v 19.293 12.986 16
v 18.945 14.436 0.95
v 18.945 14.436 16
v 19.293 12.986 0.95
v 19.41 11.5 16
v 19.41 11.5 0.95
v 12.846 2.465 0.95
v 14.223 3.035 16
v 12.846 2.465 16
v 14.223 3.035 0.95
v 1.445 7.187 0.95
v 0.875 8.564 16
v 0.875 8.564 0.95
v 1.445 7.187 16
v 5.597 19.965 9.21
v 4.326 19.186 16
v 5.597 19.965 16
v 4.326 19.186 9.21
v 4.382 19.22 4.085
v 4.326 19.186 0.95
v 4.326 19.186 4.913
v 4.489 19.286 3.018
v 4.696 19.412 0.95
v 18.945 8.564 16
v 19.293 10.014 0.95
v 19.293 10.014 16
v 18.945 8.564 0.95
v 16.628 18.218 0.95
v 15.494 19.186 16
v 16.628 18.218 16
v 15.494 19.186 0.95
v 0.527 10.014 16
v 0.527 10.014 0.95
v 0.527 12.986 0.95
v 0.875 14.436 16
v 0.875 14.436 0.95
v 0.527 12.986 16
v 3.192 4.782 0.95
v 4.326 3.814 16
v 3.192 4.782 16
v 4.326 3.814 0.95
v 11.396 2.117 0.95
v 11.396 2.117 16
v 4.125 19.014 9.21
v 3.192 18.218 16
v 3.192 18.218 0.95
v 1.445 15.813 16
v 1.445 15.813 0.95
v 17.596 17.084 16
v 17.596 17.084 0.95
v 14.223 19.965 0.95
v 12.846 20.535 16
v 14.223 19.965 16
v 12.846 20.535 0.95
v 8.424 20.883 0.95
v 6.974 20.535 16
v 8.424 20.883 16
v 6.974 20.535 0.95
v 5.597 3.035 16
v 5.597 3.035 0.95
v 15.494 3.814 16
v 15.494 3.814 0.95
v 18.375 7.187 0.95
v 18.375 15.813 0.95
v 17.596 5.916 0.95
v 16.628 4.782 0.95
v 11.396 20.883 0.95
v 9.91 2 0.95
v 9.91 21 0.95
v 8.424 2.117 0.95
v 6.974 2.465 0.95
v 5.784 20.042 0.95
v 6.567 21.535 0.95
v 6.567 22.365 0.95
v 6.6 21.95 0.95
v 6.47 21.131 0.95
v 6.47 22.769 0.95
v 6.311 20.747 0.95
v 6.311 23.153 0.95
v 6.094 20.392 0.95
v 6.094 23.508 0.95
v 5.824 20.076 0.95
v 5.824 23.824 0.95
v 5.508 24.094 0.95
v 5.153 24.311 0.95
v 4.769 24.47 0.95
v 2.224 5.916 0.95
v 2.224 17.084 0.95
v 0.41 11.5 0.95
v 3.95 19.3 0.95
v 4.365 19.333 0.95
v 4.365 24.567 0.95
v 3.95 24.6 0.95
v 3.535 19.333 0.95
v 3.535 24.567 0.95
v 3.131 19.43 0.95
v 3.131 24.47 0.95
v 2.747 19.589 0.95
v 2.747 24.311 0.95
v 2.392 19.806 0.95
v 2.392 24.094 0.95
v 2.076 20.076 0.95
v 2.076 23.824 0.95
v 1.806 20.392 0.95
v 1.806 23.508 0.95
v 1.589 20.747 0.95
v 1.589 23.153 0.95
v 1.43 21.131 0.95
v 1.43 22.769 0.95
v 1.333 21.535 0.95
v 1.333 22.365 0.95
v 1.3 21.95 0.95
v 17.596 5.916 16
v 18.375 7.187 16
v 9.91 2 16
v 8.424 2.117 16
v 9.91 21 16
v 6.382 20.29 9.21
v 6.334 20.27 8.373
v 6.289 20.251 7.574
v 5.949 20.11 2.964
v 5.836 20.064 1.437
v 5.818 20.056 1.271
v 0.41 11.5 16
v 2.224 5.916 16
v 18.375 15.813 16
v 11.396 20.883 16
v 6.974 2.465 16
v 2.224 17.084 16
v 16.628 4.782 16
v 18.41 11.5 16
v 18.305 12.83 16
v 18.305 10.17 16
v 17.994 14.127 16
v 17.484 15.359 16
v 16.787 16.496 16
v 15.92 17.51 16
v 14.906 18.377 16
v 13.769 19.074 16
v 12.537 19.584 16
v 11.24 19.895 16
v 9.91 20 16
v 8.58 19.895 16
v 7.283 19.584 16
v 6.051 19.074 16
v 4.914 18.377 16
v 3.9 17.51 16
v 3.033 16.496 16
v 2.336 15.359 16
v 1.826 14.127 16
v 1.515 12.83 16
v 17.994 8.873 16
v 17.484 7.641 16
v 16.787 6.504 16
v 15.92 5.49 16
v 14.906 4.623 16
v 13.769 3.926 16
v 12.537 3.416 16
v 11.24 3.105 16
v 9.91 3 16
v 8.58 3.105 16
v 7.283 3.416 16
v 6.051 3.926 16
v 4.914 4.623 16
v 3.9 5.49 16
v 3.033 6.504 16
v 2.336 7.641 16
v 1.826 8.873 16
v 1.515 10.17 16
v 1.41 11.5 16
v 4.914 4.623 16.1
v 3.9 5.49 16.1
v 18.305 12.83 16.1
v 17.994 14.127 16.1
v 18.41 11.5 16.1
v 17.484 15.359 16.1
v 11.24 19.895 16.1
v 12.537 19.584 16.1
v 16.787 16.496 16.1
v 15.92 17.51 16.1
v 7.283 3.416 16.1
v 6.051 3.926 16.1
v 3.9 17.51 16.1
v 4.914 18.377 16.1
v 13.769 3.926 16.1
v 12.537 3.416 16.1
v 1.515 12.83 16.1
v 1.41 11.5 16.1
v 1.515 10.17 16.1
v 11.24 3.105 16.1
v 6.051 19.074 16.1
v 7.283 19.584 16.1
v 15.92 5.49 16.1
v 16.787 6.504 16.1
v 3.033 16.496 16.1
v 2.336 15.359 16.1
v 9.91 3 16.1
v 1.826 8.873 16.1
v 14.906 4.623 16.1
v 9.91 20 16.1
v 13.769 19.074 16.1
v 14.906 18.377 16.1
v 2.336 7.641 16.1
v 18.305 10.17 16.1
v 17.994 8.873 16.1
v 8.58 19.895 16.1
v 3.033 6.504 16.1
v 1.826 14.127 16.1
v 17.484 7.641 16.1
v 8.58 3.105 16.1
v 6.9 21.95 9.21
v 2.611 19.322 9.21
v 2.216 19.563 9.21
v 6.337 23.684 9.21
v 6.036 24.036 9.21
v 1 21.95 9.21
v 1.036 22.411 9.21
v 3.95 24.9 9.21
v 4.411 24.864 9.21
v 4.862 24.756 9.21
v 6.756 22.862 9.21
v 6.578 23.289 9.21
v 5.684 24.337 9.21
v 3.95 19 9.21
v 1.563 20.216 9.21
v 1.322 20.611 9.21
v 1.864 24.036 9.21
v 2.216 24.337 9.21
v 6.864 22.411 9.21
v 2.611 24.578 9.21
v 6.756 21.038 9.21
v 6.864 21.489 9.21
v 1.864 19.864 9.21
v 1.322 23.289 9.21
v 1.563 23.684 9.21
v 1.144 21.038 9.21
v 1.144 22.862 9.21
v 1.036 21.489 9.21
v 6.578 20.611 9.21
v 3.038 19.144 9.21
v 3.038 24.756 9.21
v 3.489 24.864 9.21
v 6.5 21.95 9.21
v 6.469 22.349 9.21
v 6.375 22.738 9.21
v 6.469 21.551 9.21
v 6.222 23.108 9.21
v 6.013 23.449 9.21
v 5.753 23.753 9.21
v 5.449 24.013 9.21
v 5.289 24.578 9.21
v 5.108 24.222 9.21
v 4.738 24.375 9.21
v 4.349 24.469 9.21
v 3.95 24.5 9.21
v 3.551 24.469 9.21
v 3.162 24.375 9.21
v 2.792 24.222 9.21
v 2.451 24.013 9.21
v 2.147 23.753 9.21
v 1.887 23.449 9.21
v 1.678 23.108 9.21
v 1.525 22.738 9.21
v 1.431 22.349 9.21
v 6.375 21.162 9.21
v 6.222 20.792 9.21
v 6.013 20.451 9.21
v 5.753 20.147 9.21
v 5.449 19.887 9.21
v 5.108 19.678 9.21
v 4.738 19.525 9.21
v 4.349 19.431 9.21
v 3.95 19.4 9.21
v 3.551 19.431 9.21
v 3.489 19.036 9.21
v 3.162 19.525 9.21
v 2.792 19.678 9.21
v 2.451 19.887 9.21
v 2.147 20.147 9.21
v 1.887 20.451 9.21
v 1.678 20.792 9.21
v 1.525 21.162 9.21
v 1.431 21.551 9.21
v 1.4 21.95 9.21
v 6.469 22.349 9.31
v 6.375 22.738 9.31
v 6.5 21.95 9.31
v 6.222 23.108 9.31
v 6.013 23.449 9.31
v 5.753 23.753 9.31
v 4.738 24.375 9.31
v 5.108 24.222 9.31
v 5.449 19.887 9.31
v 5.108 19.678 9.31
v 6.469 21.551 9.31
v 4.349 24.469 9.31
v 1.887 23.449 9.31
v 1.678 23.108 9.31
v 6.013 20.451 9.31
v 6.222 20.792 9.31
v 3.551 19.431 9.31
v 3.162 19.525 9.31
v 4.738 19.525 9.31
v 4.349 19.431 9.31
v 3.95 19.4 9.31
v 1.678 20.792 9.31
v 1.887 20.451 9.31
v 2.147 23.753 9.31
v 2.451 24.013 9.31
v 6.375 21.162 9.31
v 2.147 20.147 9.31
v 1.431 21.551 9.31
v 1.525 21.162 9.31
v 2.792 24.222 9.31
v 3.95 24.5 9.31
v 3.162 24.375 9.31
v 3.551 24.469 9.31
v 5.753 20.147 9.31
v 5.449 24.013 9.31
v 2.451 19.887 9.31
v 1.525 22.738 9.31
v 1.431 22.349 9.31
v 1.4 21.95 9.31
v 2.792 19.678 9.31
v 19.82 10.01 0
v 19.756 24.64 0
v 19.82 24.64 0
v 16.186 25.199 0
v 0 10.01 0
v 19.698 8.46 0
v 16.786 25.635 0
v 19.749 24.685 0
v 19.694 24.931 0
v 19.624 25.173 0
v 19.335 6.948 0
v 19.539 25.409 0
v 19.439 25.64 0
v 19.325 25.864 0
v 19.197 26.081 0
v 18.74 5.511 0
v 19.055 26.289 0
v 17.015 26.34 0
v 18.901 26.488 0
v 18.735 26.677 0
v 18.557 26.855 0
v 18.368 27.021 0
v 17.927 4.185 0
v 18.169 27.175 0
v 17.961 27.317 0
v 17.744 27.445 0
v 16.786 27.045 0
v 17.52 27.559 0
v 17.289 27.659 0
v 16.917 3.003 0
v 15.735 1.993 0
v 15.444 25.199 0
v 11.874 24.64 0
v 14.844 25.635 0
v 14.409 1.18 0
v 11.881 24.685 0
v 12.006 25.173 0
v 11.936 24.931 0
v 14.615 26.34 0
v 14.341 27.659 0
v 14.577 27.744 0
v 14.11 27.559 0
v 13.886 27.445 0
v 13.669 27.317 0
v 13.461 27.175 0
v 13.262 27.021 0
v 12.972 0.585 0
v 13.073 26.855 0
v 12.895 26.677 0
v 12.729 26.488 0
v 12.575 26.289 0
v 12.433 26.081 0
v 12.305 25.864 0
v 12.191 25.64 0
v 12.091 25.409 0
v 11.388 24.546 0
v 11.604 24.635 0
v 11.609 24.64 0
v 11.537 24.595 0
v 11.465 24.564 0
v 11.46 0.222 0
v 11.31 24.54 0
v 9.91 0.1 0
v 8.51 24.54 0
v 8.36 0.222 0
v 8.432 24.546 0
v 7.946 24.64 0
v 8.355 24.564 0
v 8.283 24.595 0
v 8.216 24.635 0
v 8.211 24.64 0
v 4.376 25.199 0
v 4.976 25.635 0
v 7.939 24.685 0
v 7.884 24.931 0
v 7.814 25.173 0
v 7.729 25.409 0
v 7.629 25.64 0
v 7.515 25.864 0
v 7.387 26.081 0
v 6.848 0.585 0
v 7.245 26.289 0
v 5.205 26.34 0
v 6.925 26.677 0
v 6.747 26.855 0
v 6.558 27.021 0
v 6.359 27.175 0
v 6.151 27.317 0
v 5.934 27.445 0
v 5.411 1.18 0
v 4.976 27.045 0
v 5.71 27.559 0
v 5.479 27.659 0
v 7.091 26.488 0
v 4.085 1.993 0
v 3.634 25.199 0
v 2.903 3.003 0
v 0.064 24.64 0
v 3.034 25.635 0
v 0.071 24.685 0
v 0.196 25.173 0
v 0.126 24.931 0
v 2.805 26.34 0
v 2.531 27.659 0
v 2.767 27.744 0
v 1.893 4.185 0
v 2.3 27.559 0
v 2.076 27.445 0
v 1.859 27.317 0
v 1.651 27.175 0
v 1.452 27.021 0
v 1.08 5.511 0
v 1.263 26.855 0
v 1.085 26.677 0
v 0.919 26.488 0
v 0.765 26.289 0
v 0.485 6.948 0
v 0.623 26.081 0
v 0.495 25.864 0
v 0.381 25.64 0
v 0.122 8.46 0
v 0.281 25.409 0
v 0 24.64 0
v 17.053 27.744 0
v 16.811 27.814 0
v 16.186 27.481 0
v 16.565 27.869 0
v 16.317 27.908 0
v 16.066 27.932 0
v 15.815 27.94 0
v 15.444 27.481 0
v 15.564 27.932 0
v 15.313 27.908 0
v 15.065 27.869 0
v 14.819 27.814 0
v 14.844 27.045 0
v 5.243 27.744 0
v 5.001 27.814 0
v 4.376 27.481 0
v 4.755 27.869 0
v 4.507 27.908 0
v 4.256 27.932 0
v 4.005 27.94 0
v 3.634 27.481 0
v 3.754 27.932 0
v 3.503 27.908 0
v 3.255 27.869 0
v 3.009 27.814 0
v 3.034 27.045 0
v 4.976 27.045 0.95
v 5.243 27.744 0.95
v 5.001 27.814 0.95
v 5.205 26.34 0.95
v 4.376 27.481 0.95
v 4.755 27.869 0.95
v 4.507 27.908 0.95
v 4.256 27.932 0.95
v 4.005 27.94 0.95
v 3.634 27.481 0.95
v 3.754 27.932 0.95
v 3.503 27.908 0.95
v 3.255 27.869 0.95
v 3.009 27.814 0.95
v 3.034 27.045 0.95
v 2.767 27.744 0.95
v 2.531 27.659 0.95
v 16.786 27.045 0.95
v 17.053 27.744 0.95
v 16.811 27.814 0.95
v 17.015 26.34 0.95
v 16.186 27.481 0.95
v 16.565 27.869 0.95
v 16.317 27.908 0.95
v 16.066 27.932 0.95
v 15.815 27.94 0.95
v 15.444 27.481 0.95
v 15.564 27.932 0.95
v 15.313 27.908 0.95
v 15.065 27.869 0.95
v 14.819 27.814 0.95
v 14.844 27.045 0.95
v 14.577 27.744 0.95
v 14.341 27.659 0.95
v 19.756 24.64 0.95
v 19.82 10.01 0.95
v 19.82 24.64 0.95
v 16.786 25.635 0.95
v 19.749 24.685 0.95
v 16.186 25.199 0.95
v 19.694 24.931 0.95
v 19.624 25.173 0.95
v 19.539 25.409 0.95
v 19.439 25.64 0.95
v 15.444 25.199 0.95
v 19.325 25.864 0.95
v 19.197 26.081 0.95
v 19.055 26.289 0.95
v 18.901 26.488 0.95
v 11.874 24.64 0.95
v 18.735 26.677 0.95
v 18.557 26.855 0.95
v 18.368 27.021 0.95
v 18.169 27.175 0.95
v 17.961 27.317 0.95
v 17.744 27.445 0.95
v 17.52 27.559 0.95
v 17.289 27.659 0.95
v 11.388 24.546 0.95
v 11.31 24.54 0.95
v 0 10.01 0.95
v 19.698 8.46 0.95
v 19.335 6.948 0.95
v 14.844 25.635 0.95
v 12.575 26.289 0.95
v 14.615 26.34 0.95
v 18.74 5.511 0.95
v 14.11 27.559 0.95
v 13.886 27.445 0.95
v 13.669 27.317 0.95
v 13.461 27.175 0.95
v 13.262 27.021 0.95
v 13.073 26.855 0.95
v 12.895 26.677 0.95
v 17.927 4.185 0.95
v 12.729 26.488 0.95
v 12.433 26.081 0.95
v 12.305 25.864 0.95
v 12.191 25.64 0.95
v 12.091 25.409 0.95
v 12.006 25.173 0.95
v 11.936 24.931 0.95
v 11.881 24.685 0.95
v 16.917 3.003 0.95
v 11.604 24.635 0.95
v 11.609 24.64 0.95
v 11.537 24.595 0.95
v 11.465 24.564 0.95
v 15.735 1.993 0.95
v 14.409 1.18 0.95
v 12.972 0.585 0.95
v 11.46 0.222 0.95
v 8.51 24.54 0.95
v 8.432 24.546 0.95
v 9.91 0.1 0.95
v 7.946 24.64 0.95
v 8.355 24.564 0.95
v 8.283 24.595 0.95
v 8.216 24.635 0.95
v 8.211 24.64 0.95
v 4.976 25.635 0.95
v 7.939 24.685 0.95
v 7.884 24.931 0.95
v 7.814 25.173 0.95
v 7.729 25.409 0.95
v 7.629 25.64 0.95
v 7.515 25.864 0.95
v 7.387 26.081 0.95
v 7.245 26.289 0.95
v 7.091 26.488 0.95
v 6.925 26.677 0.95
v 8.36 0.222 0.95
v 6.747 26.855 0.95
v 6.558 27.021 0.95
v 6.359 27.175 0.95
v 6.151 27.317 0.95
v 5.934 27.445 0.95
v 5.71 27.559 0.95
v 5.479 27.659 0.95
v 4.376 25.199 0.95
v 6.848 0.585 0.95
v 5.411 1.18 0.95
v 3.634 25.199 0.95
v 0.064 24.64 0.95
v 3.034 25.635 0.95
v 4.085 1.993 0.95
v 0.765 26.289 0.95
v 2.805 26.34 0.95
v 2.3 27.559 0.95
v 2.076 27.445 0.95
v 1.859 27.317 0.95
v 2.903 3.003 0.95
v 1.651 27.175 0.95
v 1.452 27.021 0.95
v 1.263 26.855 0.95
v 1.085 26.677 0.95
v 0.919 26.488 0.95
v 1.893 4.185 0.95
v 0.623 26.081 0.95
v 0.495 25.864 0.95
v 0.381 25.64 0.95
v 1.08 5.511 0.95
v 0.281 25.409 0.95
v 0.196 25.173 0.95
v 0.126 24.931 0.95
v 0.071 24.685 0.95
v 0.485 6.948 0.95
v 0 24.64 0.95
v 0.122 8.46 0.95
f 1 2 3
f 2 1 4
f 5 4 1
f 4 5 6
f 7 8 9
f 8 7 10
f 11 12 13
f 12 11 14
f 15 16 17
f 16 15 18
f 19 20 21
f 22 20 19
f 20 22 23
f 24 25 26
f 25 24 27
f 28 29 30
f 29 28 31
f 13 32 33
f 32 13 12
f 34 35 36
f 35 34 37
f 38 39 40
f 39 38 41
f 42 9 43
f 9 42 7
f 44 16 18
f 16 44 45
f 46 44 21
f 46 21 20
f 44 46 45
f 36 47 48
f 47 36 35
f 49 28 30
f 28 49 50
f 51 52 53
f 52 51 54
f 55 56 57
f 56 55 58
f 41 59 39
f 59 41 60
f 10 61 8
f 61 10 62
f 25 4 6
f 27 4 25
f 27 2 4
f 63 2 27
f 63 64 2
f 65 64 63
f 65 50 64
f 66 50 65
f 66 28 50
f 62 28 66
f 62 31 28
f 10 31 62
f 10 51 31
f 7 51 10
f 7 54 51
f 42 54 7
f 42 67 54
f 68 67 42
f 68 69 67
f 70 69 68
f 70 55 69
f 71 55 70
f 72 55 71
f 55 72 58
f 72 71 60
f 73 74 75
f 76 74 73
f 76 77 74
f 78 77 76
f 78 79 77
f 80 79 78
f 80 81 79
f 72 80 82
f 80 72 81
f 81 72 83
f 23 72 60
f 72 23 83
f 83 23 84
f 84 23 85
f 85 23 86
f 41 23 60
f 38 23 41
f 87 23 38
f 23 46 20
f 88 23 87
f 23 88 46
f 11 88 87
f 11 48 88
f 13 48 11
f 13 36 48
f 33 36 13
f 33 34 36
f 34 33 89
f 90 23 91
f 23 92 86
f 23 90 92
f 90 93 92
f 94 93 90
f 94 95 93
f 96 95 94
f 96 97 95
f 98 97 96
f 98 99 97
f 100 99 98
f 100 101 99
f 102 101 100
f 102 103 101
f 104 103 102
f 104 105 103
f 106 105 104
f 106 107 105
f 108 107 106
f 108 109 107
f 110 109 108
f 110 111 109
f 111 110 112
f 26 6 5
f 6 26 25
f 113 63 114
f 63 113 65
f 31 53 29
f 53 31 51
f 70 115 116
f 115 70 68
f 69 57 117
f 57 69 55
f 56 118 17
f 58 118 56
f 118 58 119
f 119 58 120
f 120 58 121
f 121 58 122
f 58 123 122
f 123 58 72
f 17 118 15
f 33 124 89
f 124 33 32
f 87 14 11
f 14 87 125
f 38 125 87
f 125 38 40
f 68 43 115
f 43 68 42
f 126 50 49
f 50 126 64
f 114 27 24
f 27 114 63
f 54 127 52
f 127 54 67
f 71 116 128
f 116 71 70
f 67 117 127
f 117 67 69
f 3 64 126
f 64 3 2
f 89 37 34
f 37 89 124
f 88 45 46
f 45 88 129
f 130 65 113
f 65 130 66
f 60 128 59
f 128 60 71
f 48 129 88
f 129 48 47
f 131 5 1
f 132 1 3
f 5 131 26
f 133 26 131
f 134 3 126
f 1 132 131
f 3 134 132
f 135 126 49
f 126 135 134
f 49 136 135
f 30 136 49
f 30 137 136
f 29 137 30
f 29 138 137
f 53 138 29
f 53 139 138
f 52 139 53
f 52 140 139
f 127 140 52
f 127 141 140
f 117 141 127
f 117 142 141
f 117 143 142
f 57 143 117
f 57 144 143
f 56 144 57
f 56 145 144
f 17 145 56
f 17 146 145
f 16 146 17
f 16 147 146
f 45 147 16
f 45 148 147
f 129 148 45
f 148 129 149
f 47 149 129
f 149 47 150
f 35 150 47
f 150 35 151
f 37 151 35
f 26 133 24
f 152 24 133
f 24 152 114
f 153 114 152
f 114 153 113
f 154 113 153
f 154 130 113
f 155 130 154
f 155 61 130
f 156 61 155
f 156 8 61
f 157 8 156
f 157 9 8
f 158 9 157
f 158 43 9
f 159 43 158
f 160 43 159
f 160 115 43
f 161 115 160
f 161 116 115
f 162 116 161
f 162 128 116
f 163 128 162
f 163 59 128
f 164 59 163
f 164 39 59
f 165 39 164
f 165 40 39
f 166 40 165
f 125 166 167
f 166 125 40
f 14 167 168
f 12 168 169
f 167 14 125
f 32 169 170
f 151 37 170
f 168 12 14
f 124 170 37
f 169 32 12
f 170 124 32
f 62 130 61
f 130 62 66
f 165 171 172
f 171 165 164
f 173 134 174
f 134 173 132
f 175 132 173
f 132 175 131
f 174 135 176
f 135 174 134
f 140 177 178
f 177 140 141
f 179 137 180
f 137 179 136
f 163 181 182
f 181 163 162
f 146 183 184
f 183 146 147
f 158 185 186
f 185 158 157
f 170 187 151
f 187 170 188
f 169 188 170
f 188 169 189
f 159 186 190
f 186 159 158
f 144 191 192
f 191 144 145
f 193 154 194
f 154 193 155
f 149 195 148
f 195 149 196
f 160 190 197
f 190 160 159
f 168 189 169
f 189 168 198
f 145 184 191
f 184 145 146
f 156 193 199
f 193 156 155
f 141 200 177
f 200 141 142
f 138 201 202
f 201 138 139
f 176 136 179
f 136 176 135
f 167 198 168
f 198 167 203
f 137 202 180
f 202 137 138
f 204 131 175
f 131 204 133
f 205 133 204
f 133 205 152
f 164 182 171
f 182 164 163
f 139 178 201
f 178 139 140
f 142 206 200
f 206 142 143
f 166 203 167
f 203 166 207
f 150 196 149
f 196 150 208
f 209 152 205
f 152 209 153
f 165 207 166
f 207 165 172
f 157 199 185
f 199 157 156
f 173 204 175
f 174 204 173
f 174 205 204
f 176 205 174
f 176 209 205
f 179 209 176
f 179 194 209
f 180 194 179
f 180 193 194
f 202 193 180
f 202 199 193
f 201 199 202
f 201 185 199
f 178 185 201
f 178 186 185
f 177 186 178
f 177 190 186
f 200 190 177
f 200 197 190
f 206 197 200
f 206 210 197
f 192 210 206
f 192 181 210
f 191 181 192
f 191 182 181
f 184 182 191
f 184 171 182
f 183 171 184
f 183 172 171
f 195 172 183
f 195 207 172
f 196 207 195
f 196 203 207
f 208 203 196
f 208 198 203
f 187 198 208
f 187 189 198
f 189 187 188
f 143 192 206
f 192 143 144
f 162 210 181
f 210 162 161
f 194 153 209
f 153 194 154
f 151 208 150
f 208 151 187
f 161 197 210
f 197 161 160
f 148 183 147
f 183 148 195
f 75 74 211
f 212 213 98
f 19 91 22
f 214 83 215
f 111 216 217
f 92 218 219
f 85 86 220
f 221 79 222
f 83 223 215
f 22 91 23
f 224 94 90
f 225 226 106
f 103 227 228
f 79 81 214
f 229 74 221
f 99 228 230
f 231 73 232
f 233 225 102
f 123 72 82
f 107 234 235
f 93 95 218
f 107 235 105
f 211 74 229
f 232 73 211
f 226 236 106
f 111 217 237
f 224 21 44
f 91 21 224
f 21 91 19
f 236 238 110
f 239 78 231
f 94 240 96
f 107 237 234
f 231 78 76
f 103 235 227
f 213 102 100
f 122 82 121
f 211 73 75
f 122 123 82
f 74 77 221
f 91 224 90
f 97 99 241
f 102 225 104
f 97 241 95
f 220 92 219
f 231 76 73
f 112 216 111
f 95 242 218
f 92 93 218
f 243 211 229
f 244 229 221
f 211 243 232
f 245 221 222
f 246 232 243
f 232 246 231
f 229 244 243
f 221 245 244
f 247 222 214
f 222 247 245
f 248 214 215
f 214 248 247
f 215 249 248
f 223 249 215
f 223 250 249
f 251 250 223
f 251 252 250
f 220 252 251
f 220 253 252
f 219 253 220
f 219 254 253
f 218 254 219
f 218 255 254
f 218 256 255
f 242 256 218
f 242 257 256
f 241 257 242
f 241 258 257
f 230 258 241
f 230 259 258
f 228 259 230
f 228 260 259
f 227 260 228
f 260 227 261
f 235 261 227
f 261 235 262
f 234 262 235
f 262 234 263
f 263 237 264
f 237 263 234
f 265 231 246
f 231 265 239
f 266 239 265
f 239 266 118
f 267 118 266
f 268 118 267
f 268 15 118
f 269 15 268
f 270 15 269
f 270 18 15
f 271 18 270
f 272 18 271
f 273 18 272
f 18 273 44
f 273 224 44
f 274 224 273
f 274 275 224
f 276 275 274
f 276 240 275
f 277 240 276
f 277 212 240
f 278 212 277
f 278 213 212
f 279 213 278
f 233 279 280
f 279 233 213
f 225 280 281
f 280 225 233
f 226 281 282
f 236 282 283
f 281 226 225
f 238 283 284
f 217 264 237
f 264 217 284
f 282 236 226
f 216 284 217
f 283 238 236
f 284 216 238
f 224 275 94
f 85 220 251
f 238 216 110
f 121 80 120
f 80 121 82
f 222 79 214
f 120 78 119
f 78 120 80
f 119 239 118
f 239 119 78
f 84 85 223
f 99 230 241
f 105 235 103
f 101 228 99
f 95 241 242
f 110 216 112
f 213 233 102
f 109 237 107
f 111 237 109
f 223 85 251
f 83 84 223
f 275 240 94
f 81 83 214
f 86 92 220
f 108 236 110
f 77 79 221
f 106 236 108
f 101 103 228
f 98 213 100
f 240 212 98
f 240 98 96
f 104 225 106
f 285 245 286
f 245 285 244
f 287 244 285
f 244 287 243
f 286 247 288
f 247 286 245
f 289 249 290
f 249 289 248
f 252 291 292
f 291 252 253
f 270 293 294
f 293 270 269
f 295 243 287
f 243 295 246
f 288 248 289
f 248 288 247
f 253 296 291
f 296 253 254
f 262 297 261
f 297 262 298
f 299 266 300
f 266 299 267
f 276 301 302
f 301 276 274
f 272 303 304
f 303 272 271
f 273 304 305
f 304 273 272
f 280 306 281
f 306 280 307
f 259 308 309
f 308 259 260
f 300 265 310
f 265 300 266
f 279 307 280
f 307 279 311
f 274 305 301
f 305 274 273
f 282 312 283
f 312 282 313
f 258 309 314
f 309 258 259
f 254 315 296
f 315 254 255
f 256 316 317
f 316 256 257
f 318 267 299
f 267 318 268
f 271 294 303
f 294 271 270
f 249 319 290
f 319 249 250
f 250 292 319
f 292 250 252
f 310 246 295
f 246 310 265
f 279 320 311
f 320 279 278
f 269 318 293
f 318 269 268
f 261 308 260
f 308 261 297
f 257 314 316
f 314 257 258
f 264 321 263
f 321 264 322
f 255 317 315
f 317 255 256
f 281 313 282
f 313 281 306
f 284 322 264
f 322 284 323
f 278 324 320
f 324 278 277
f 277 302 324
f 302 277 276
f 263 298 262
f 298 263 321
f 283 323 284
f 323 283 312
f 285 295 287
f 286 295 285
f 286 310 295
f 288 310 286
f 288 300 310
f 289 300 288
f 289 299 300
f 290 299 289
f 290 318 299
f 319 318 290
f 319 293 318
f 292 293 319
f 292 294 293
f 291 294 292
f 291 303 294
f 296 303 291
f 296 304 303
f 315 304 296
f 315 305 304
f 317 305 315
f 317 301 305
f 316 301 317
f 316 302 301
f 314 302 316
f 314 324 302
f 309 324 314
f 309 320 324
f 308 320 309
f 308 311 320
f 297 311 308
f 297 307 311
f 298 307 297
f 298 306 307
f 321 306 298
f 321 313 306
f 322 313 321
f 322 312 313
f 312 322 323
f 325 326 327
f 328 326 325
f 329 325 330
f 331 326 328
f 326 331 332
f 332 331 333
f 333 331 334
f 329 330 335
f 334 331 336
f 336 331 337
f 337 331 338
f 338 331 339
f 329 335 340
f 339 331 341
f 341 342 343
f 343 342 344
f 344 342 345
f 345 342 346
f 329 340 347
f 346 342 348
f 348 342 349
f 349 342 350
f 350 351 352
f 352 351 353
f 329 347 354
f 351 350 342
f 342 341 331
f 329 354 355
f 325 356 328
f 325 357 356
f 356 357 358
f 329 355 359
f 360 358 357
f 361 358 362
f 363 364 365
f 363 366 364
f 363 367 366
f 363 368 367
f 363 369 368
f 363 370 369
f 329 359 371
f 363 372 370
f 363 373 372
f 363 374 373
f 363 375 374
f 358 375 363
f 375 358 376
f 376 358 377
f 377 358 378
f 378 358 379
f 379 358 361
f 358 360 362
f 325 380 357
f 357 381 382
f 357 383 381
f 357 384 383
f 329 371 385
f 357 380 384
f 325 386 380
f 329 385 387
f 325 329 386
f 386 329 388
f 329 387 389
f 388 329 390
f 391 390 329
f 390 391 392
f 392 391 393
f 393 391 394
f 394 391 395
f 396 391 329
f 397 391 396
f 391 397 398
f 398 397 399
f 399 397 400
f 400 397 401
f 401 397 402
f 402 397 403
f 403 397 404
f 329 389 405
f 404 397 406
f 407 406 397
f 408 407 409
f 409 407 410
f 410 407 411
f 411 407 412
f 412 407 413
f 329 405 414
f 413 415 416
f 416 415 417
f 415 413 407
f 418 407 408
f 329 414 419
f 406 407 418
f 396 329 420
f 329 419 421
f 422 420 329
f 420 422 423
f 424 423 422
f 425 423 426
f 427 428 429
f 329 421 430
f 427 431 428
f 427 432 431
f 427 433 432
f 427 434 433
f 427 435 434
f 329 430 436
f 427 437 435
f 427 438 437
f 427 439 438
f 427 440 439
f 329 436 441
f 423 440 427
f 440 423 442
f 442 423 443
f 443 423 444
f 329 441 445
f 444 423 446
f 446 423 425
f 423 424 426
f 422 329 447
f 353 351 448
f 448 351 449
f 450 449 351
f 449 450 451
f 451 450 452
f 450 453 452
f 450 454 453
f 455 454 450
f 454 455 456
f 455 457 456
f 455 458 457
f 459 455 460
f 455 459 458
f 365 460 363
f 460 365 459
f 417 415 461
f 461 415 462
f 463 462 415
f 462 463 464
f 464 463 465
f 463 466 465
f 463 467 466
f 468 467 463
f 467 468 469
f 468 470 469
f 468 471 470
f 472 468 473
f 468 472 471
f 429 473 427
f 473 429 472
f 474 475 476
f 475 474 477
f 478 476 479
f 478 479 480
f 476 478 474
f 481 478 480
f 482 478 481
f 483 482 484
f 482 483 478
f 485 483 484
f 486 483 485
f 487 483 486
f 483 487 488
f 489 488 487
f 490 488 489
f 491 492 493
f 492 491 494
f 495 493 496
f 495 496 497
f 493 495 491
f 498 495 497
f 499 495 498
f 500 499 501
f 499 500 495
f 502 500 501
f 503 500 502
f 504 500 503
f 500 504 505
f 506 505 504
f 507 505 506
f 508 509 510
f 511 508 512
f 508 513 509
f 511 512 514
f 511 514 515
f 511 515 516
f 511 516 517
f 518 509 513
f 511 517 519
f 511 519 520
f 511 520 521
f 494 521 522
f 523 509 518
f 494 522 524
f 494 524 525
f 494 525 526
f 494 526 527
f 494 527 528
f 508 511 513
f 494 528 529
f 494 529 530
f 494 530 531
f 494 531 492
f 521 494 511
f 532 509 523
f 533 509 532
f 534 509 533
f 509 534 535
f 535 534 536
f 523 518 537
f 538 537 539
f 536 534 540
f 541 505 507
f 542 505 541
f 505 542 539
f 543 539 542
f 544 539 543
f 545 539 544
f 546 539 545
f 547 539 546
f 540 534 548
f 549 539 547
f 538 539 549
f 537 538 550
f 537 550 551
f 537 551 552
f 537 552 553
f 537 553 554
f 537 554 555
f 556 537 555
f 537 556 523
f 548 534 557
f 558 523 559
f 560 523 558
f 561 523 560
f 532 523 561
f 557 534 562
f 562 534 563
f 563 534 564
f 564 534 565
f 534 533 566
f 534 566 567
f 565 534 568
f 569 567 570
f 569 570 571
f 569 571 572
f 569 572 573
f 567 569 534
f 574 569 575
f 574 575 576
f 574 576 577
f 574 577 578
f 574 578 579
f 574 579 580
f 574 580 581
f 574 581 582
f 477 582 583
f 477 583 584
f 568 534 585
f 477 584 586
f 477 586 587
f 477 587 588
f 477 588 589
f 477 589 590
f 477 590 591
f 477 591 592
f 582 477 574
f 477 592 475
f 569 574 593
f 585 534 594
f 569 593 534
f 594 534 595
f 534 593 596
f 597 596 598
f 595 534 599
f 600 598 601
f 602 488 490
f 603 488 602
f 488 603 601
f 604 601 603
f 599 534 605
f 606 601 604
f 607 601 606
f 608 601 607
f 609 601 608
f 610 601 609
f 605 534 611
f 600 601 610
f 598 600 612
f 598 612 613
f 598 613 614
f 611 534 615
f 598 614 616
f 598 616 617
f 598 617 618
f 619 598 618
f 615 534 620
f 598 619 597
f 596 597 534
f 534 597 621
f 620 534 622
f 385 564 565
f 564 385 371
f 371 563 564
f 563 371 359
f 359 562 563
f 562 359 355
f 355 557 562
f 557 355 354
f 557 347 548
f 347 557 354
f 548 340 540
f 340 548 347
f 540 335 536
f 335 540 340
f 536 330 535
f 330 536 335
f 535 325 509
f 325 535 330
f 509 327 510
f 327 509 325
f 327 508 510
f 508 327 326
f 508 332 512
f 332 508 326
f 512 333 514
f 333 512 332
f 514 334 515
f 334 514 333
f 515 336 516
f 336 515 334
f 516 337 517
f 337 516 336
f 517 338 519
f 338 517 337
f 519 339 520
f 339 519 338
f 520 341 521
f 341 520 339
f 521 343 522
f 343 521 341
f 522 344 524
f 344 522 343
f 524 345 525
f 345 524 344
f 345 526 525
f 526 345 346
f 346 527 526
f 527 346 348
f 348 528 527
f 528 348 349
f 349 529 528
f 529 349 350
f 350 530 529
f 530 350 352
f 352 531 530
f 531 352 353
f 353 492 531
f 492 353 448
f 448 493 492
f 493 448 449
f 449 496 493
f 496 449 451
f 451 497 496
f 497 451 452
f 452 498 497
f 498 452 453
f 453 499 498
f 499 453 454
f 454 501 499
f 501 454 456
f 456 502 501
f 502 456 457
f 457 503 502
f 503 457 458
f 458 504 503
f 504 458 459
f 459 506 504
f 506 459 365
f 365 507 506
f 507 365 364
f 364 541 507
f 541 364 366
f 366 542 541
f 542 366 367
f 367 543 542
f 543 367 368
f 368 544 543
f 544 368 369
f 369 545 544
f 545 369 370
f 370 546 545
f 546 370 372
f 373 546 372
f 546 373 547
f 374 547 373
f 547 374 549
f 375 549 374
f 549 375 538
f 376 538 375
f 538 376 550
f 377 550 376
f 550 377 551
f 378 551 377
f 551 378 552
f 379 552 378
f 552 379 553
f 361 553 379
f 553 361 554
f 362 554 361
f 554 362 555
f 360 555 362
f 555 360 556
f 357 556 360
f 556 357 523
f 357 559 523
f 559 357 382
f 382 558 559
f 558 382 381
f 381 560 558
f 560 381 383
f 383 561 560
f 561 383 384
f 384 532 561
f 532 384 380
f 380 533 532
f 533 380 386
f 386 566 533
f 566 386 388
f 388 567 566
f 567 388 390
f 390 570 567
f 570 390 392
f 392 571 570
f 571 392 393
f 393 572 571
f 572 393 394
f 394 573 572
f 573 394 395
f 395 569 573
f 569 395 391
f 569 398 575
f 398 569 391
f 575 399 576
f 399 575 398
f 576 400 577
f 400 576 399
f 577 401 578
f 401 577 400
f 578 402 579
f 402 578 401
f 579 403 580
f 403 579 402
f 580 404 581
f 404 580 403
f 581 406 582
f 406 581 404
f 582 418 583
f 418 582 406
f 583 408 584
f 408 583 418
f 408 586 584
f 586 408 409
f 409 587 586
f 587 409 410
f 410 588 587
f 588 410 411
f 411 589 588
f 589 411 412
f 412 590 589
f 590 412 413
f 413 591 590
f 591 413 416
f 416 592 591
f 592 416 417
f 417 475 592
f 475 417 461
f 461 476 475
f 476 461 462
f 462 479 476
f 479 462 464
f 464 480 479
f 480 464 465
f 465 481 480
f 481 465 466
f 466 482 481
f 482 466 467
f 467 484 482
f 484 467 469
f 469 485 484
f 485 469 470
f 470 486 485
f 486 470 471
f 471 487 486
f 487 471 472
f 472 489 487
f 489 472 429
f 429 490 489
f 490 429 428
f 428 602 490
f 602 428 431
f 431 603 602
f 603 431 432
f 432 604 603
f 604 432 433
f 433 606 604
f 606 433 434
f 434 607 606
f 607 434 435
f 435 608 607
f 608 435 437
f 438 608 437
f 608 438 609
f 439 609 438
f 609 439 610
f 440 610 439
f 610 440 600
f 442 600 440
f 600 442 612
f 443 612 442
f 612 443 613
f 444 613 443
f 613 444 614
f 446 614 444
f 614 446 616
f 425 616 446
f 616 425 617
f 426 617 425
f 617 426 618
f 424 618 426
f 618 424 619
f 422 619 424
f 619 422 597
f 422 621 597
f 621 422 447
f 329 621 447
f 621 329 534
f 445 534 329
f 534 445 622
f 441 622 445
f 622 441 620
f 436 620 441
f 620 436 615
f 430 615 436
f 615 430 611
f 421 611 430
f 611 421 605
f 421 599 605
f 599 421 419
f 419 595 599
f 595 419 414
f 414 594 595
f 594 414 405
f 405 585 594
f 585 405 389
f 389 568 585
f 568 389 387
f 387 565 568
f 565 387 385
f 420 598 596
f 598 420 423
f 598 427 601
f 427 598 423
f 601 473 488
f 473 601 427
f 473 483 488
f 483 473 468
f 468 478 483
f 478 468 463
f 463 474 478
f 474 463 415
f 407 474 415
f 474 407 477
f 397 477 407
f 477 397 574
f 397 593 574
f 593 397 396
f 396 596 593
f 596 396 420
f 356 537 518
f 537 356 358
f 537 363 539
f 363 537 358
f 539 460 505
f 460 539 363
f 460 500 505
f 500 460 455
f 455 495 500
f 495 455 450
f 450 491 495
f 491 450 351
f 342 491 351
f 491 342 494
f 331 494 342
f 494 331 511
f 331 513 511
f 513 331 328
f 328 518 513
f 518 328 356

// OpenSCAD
/**
 * Placeholder model for the Waveshare Infrared LED Light Board
 (https://www.waveshare.com/infrared-led-board.html or
 https://www.waveshare.com/infrared-led-board-b.html)
 *
 * - Visual mockup of the Waveshare Infrared LED Light Board used for
 *   assembly previews and placement checks. Not an electrical or
 *   manufacturable PCB model - intended only for geometry/layout in the
 *   larger assembly (e.g., scad/ir_case.scad and head/head_mount.scad).
 *
 * Main modules
 * - ir_led_board()            // renders the PCB, mounting ears, bolt holes,
 *                             // the LED body and its light detector - centered
 *                             // for easy placement in assemblies.
 * - ir_led()                  // renders only the LED cylinder (useful for
 *                             // quick positioning, testing or isolated previews).
 *
 *
 * Author: Karim Aziiev <karim.aziiev@gmail.com>
 * License: GPL-3.0-or-later
 */

include <../colors.scad>
include <../parameters.scad>

use <../lib/shapes2d.scad>

module ir_led_light_detector() {
  rad_1 = ir_led_light_detector_dia_1 / 2;
  rad_2 = ir_led_light_detector_dia_2 / 2;

  translate([max(rad_1, rad_2), max(rad_1, rad_2), 0]) {
    color(matte_black, alpha=1) {
      cylinder(h=ir_led_light_detector_h,
               r1=rad_1,
               r2=rad_2,
               center=false,
               $fn=40);
    }
    translate([0, 0, ir_led_light_detector_h]) {
      color("lightpink", alpha=0.6) {
        cylinder(h=0.1,
                 r=rad_2 - 0.4,
                 center=false,
                 $fn=40);
      }
    }
  }
}

module ir_led() {
  rad = ir_led_dia / 2;
  translate([rad, rad, 0]) {
    color(matte_black, alpha=1) {
      cylinder(h=ir_led_height,
               r=rad,
               center=false,
               $fn=40);
    }
    translate([0, 0, ir_led_height]) {
      color(ir_1, alpha=0.6) {
        cylinder(h=0.1,
                 r=rad - 1,
                 center=false,
                 $fn=40);
      }
    }
  }
}

module ir_led_board() {
  ear_dia = (ir_led_board_w - ir_led_board_cutout_depth) / 2 - 0.2;
  ear_rad = ear_dia / 2;
  bolt_rad = ir_led_bolt_dia / 2;
  union() {
    color(matte_black, alpha=1) {
      linear_extrude(height=ir_led_thickness, center=false) {
        translate([0, ir_led_board_len, 0]) {
          rotate([180, 0, 0]) {
            difference() {
              union() {
                translate([0, ir_led_board_cutout_depth - 0.1, 0]) {
                  rounded_rect_two([ir_led_board_w,
                                    ir_led_board_len
                                    - ir_led_board_cutout_depth],
                                   r=min(ir_led_board_w, ir_led_board_len)
                                     * 0.5);
                }
                translate([0, ear_rad, 0]) {
                  translate([ear_rad, 0, 0]) {
                    circle(r=ear_rad, $fn=100);
                  }
                  translate([ir_led_board_w - ear_rad, 0, 0]) {
                    circle(r=ear_rad, $fn=100);
                  }
                }
              }
              translate([ir_led_board_w / 2, ir_led_board_cutout_depth / 2, 0]) {
                rect_w = ir_led_board_w - (ear_dia * 2);
                rounded_rect([rect_w, ir_led_board_cutout_depth],
                             center=true,
                             r=0.5,
                             fn=40);
              }
              translate([0,
                         bolt_rad + 0.4,
                         0]) {
                translate([ear_rad, 0, 0]) {
                  circle(r=bolt_rad, $fn=10);
                }
                translate([ir_led_board_w - ear_rad, 0, 0]) {
                  circle(r=bolt_rad, $fn=10);
                }
              }
            }
          }
        }
      }
    }
    translate([ir_led_board_w / 2
               - ir_led_dia / 2,
               ir_led_y_offset,
               ir_led_thickness]) {
      ir_led();
    }
    translate([ir_led_light_detector_offset_x,
               ir_led_y_offset + ir_led_dia
               + ir_led_light_detector_offset_from_led,
               ir_led_thickness]) {
      ir_led_light_detector();
    }
  }
}

ir_led_board();
